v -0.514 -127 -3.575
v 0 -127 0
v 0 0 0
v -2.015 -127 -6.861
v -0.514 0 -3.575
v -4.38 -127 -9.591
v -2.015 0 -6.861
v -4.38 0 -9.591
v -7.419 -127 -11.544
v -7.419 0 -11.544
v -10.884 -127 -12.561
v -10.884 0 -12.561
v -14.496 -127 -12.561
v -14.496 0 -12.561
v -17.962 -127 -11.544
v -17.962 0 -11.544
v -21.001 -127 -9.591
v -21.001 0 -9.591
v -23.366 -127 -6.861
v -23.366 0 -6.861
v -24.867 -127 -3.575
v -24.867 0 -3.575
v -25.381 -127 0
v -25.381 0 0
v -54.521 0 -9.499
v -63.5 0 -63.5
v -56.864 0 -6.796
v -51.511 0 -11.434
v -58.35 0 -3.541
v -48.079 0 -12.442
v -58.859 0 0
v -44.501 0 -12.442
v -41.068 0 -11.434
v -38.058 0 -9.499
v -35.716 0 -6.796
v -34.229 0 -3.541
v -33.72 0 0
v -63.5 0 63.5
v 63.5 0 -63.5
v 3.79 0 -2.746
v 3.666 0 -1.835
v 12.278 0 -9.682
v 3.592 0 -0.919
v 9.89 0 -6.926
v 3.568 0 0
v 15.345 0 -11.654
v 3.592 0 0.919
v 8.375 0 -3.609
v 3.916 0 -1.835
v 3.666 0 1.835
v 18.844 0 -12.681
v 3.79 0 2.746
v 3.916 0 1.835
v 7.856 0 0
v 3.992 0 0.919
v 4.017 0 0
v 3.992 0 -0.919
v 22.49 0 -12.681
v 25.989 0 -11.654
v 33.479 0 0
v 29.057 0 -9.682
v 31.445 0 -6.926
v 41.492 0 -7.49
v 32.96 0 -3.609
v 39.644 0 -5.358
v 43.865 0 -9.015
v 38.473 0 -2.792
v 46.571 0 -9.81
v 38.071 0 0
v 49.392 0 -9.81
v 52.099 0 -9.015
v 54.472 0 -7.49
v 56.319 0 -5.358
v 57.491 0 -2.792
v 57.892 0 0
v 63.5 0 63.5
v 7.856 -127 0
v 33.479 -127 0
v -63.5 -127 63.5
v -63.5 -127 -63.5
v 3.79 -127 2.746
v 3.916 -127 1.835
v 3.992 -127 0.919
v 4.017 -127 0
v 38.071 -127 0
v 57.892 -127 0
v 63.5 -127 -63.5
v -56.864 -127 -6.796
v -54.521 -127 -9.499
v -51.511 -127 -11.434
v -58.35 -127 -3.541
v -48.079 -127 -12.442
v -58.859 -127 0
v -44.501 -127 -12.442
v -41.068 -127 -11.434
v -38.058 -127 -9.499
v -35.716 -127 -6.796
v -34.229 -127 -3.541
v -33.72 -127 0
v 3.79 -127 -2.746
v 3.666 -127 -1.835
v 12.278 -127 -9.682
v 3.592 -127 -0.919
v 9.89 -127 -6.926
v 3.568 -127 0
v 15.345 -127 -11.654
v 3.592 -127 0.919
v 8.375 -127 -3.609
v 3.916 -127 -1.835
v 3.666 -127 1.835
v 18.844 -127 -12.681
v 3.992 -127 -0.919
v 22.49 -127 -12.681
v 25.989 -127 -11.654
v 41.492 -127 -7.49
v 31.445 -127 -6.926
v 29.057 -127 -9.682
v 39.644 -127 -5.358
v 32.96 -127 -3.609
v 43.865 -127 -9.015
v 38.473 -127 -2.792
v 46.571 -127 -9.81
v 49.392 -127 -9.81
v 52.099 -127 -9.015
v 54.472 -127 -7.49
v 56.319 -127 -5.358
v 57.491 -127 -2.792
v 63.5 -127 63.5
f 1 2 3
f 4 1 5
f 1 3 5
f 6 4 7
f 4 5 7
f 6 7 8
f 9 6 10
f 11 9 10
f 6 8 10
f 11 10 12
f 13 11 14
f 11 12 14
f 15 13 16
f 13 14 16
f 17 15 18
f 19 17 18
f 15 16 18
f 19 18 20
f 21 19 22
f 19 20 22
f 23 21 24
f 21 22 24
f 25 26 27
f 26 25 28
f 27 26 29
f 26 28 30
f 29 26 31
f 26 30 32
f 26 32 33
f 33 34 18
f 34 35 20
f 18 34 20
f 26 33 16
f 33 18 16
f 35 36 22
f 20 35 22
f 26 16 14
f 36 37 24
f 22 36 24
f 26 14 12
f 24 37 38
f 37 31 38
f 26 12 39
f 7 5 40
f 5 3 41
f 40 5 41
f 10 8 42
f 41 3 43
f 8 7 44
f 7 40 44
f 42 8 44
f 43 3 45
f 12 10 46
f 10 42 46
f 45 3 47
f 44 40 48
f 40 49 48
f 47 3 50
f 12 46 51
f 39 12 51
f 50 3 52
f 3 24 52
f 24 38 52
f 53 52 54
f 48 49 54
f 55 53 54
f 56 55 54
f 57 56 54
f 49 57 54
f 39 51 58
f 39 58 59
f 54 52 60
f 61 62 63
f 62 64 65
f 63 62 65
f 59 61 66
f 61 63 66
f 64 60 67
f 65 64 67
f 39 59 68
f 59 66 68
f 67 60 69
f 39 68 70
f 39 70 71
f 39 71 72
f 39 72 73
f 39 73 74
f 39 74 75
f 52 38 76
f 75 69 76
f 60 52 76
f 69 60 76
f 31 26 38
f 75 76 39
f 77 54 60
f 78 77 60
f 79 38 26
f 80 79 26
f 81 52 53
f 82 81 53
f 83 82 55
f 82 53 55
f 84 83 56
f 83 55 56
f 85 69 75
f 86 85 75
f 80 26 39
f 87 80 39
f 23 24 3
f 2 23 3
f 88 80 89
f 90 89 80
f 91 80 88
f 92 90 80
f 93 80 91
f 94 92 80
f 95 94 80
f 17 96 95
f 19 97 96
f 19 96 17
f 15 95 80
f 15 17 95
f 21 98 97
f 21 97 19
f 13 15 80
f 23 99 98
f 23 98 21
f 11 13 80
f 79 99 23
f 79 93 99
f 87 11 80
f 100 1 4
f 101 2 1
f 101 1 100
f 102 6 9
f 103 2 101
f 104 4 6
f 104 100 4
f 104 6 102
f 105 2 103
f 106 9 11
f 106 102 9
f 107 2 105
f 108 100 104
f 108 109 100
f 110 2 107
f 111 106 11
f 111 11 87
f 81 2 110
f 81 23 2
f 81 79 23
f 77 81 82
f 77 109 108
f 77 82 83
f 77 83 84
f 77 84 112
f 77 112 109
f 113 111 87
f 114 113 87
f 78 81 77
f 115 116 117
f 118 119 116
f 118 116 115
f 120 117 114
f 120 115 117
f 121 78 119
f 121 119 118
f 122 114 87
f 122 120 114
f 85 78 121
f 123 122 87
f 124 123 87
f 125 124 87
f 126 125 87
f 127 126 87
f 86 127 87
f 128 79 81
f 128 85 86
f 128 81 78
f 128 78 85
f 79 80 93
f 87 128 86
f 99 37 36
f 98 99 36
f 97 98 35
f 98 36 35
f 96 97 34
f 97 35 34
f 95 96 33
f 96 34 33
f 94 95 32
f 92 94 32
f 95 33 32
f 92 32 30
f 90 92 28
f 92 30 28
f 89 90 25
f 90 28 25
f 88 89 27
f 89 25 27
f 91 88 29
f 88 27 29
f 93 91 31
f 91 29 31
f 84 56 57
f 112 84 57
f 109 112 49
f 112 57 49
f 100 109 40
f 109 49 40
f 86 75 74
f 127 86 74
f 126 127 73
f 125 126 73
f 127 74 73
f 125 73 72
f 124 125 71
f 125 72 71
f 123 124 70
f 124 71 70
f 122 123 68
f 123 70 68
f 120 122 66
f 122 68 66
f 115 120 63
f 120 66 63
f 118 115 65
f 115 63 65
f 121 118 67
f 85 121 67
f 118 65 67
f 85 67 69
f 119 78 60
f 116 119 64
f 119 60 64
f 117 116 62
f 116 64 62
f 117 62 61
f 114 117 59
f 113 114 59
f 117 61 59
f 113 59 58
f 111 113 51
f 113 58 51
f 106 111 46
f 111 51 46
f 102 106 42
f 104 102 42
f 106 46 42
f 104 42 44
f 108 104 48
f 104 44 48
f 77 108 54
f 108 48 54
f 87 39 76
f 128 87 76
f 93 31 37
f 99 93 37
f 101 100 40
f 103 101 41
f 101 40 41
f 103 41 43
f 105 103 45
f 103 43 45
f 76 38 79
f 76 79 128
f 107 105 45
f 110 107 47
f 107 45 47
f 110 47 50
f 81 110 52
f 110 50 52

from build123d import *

# Parameters (mm, degrees)
F0_W     = 127
F0_H     = 43.0744847506
F1_DEPTH = 127


with BuildPart() as f1:
    # F0 (on Front) → F1 (new body)
    with BuildSketch(Plane.XZ):
        with Locations((0, 41.9627576247)):
            Rectangle(F0_W, F0_H)
        with Locations((0, -41.9627576247)):
            Rectangle(F0_W, F0_H)
        with BuildLine():
            Line((63.5, -20.4255152494), (63.5, 0))
            Line((63.5, 0), (60.0370731576, 0))
            ThreePointArc((60.0370731576, 0), (50.5451090429, -11.7795835352), (37.0166287351, -5.0093404391))
            ThreePointArc((37.0166287351, -5.0093404391), (19.5052616542, -17.06006857), (3.7896064307, -2.7462219024))
            ThreePointArc((3.7896064307, -2.7462219024), (-14.0682122313, -16.6503534924), (-29.3976705132, 0))
            Line((-29.3976705132, 0), (-29.8486748192, 0))
            ThreePointArc((-29.8486748192, 0), (-46.2897717953, -16.4410969761), (-62.7308687714, 0))
            Line((-62.7308687714, 0), (-63.5, 0))
            Line((-63.5, 0), (-63.5, -20.4255152494))
            Line((-63.5, -20.4255152494), (63.5, -20.4255152494))
        make_face()
        with BuildLine():
            Line((63.5, 0), (63.5, 20.4255152494))
            Line((63.5, 20.4255152494), (-63.5, 20.4255152494))
            Line((-63.5, 20.4255152494), (-63.5, 0))
            Line((-63.5, 0), (-62.7308687714, 0))
            ThreePointArc((-62.7308687714, 0), (-46.2897717953, 16.4410969761), (-29.8486748192, 0))
            Line((-29.8486748192, 0), (-29.3976705132, 0))
            ThreePointArc((-29.3976705132, 0), (-14.0682122313, 16.6503534924), (3.7896064307, 2.7462219024))
            ThreePointArc((3.7896064307, 2.7462219024), (19.5052616542, 17.06006857), (37.0166287351, 5.0093404391))
            ThreePointArc((37.0166287351, 5.0093404391), (50.5451090429, 11.7795835352), (60.0370731576, 0))
            Line((60.0370731576, 0), (63.5, 0))
        make_face()
        with BuildLine():
            ThreePointArc((-29.3976705132, 0), (-14.0682122313, -16.6503534924), (3.7896064307, -2.7462219024))
            ThreePointArc((3.7896064307, -2.7462219024), (3.6232234507, -1.3775887394), (3.5676420141, 0))
            Line((3.5676420141, 0), (0, 0))
            ThreePointArc((0, 0), (-12.6904081553, -12.6904081553), (-25.3808163106, 0))
            Line((-25.3808163106, 0), (-29.3976705132, 0))
        make_face()
        with BuildLine():
            ThreePointArc((3.5676420141, 0), (3.6232234507, 1.3775887394), (3.7896064307, 2.7462219024))
            ThreePointArc((3.7896064307, 2.7462219024), (-14.0682122313, 16.6503534924), (-29.3976705132, 0))
            Line((-29.3976705132, 0), (-25.3808163106, 0))
            Line((-25.3808163106, 0), (0, 0))
            Line((0, 0), (3.5676420141, 0))
        make_face()
        with BuildLine():
            ThreePointArc((-29.8486748192, 0), (-46.2897717953, 16.4410969761), (-62.7308687714, 0))
            Line((-62.7308687714, 0), (-58.8593184948, 0))
            Line((-58.8593184948, 0), (-33.7202250957, 0))
            Line((-33.7202250957, 0), (-29.8486748192, 0))
        make_face()
        with BuildLine():
            ThreePointArc((35.9265762941, 0), (36.2022411907, 2.563284317), (37.0166287351, 5.0093404391))
            ThreePointArc((37.0166287351, 5.0093404391), (19.5052616542, 17.06006857), (3.7896064307, 2.7462219024))
            ThreePointArc((3.7896064307, 2.7462219024), (3.9599453371, 1.377804076), (4.0168542025, 0))
            Line((4.0168542025, 0), (7.8559666872, 0))
            Line((7.8559666872, 0), (33.4785059094, 0))
            Line((33.4785059094, 0), (35.9265762941, 0))
        make_face()
        with BuildLine():
            Line((57.8924268484, 0), (60.0370731576, 0))
            ThreePointArc((60.0370731576, 0), (50.5451090429, 11.7795835352), (37.0166287351, 5.0093404391))
            ThreePointArc((37.0166287351, 5.0093404391), (37.5782401442, 2.5326021424), (37.7668305826, 0))
            Line((37.7668305826, 0), (38.0712226033, 0))
            Line((38.0712226033, 0), (57.8924268484, 0))
        make_face()
        with BuildLine():
            ThreePointArc((37.0166287351, -5.0093404391), (50.5451090429, -11.7795835352), (60.0370731576, 0))
            Line((60.0370731576, 0), (57.8924268484, 0))
            ThreePointArc((57.8924268484, 0), (47.9818247259, -9.9106021225), (38.0712226033, 0))
            Line((38.0712226033, 0), (37.7668305826, 0))
            ThreePointArc((37.7668305826, 0), (37.5782401442, -2.5326021424), (37.0166287351, -5.0093404391))
        make_face()
        with BuildLine():
            ThreePointArc((35.9265762941, 0), (36.2022411907, -2.563284317), (37.0166287351, -5.0093404391))
            ThreePointArc((37.0166287351, -5.0093404391), (37.5782401442, -2.5326021424), (37.7668305826, 0))
            Line((37.7668305826, 0), (35.9265762941, 0))
        make_face()
        with BuildLine():
            ThreePointArc((37.7668305826, 0), (37.5782401442, 2.5326021424), (37.0166287351, 5.0093404391))
            ThreePointArc((37.0166287351, 5.0093404391), (36.2022411907, 2.563284317), (35.9265762941, 0))
            Line((35.9265762941, 0), (37.7668305826, 0))
        make_face()
        with BuildLine():
            ThreePointArc((3.7896064307, -2.7462219024), (19.5052616542, -17.06006857), (37.0166287351, -5.0093404391))
            ThreePointArc((37.0166287351, -5.0093404391), (36.2022411907, -2.563284317), (35.9265762941, 0))
            Line((35.9265762941, 0), (33.4785059094, 0))
            ThreePointArc((33.4785059094, 0), (20.6672362983, -12.8112696111), (7.8559666872, 0))
            Line((7.8559666872, 0), (4.0168542025, 0))
            ThreePointArc((4.0168542025, 0), (3.9599453371, -1.377804076), (3.7896064307, -2.7462219024))
        make_face()
        with BuildLine():
            Line((-58.8593184948, 0), (-62.7308687714, 0))
            ThreePointArc((-62.7308687714, 0), (-46.2897717953, -16.4410969761), (-29.8486748192, 0))
            Line((-29.8486748192, 0), (-33.7202250957, 0))
            ThreePointArc((-33.7202250957, 0), (-46.2897717953, -12.5695466995), (-58.8593184948, 0))
        make_face()
    extrude(amount=F1_DEPTH)


solid = f1.part
